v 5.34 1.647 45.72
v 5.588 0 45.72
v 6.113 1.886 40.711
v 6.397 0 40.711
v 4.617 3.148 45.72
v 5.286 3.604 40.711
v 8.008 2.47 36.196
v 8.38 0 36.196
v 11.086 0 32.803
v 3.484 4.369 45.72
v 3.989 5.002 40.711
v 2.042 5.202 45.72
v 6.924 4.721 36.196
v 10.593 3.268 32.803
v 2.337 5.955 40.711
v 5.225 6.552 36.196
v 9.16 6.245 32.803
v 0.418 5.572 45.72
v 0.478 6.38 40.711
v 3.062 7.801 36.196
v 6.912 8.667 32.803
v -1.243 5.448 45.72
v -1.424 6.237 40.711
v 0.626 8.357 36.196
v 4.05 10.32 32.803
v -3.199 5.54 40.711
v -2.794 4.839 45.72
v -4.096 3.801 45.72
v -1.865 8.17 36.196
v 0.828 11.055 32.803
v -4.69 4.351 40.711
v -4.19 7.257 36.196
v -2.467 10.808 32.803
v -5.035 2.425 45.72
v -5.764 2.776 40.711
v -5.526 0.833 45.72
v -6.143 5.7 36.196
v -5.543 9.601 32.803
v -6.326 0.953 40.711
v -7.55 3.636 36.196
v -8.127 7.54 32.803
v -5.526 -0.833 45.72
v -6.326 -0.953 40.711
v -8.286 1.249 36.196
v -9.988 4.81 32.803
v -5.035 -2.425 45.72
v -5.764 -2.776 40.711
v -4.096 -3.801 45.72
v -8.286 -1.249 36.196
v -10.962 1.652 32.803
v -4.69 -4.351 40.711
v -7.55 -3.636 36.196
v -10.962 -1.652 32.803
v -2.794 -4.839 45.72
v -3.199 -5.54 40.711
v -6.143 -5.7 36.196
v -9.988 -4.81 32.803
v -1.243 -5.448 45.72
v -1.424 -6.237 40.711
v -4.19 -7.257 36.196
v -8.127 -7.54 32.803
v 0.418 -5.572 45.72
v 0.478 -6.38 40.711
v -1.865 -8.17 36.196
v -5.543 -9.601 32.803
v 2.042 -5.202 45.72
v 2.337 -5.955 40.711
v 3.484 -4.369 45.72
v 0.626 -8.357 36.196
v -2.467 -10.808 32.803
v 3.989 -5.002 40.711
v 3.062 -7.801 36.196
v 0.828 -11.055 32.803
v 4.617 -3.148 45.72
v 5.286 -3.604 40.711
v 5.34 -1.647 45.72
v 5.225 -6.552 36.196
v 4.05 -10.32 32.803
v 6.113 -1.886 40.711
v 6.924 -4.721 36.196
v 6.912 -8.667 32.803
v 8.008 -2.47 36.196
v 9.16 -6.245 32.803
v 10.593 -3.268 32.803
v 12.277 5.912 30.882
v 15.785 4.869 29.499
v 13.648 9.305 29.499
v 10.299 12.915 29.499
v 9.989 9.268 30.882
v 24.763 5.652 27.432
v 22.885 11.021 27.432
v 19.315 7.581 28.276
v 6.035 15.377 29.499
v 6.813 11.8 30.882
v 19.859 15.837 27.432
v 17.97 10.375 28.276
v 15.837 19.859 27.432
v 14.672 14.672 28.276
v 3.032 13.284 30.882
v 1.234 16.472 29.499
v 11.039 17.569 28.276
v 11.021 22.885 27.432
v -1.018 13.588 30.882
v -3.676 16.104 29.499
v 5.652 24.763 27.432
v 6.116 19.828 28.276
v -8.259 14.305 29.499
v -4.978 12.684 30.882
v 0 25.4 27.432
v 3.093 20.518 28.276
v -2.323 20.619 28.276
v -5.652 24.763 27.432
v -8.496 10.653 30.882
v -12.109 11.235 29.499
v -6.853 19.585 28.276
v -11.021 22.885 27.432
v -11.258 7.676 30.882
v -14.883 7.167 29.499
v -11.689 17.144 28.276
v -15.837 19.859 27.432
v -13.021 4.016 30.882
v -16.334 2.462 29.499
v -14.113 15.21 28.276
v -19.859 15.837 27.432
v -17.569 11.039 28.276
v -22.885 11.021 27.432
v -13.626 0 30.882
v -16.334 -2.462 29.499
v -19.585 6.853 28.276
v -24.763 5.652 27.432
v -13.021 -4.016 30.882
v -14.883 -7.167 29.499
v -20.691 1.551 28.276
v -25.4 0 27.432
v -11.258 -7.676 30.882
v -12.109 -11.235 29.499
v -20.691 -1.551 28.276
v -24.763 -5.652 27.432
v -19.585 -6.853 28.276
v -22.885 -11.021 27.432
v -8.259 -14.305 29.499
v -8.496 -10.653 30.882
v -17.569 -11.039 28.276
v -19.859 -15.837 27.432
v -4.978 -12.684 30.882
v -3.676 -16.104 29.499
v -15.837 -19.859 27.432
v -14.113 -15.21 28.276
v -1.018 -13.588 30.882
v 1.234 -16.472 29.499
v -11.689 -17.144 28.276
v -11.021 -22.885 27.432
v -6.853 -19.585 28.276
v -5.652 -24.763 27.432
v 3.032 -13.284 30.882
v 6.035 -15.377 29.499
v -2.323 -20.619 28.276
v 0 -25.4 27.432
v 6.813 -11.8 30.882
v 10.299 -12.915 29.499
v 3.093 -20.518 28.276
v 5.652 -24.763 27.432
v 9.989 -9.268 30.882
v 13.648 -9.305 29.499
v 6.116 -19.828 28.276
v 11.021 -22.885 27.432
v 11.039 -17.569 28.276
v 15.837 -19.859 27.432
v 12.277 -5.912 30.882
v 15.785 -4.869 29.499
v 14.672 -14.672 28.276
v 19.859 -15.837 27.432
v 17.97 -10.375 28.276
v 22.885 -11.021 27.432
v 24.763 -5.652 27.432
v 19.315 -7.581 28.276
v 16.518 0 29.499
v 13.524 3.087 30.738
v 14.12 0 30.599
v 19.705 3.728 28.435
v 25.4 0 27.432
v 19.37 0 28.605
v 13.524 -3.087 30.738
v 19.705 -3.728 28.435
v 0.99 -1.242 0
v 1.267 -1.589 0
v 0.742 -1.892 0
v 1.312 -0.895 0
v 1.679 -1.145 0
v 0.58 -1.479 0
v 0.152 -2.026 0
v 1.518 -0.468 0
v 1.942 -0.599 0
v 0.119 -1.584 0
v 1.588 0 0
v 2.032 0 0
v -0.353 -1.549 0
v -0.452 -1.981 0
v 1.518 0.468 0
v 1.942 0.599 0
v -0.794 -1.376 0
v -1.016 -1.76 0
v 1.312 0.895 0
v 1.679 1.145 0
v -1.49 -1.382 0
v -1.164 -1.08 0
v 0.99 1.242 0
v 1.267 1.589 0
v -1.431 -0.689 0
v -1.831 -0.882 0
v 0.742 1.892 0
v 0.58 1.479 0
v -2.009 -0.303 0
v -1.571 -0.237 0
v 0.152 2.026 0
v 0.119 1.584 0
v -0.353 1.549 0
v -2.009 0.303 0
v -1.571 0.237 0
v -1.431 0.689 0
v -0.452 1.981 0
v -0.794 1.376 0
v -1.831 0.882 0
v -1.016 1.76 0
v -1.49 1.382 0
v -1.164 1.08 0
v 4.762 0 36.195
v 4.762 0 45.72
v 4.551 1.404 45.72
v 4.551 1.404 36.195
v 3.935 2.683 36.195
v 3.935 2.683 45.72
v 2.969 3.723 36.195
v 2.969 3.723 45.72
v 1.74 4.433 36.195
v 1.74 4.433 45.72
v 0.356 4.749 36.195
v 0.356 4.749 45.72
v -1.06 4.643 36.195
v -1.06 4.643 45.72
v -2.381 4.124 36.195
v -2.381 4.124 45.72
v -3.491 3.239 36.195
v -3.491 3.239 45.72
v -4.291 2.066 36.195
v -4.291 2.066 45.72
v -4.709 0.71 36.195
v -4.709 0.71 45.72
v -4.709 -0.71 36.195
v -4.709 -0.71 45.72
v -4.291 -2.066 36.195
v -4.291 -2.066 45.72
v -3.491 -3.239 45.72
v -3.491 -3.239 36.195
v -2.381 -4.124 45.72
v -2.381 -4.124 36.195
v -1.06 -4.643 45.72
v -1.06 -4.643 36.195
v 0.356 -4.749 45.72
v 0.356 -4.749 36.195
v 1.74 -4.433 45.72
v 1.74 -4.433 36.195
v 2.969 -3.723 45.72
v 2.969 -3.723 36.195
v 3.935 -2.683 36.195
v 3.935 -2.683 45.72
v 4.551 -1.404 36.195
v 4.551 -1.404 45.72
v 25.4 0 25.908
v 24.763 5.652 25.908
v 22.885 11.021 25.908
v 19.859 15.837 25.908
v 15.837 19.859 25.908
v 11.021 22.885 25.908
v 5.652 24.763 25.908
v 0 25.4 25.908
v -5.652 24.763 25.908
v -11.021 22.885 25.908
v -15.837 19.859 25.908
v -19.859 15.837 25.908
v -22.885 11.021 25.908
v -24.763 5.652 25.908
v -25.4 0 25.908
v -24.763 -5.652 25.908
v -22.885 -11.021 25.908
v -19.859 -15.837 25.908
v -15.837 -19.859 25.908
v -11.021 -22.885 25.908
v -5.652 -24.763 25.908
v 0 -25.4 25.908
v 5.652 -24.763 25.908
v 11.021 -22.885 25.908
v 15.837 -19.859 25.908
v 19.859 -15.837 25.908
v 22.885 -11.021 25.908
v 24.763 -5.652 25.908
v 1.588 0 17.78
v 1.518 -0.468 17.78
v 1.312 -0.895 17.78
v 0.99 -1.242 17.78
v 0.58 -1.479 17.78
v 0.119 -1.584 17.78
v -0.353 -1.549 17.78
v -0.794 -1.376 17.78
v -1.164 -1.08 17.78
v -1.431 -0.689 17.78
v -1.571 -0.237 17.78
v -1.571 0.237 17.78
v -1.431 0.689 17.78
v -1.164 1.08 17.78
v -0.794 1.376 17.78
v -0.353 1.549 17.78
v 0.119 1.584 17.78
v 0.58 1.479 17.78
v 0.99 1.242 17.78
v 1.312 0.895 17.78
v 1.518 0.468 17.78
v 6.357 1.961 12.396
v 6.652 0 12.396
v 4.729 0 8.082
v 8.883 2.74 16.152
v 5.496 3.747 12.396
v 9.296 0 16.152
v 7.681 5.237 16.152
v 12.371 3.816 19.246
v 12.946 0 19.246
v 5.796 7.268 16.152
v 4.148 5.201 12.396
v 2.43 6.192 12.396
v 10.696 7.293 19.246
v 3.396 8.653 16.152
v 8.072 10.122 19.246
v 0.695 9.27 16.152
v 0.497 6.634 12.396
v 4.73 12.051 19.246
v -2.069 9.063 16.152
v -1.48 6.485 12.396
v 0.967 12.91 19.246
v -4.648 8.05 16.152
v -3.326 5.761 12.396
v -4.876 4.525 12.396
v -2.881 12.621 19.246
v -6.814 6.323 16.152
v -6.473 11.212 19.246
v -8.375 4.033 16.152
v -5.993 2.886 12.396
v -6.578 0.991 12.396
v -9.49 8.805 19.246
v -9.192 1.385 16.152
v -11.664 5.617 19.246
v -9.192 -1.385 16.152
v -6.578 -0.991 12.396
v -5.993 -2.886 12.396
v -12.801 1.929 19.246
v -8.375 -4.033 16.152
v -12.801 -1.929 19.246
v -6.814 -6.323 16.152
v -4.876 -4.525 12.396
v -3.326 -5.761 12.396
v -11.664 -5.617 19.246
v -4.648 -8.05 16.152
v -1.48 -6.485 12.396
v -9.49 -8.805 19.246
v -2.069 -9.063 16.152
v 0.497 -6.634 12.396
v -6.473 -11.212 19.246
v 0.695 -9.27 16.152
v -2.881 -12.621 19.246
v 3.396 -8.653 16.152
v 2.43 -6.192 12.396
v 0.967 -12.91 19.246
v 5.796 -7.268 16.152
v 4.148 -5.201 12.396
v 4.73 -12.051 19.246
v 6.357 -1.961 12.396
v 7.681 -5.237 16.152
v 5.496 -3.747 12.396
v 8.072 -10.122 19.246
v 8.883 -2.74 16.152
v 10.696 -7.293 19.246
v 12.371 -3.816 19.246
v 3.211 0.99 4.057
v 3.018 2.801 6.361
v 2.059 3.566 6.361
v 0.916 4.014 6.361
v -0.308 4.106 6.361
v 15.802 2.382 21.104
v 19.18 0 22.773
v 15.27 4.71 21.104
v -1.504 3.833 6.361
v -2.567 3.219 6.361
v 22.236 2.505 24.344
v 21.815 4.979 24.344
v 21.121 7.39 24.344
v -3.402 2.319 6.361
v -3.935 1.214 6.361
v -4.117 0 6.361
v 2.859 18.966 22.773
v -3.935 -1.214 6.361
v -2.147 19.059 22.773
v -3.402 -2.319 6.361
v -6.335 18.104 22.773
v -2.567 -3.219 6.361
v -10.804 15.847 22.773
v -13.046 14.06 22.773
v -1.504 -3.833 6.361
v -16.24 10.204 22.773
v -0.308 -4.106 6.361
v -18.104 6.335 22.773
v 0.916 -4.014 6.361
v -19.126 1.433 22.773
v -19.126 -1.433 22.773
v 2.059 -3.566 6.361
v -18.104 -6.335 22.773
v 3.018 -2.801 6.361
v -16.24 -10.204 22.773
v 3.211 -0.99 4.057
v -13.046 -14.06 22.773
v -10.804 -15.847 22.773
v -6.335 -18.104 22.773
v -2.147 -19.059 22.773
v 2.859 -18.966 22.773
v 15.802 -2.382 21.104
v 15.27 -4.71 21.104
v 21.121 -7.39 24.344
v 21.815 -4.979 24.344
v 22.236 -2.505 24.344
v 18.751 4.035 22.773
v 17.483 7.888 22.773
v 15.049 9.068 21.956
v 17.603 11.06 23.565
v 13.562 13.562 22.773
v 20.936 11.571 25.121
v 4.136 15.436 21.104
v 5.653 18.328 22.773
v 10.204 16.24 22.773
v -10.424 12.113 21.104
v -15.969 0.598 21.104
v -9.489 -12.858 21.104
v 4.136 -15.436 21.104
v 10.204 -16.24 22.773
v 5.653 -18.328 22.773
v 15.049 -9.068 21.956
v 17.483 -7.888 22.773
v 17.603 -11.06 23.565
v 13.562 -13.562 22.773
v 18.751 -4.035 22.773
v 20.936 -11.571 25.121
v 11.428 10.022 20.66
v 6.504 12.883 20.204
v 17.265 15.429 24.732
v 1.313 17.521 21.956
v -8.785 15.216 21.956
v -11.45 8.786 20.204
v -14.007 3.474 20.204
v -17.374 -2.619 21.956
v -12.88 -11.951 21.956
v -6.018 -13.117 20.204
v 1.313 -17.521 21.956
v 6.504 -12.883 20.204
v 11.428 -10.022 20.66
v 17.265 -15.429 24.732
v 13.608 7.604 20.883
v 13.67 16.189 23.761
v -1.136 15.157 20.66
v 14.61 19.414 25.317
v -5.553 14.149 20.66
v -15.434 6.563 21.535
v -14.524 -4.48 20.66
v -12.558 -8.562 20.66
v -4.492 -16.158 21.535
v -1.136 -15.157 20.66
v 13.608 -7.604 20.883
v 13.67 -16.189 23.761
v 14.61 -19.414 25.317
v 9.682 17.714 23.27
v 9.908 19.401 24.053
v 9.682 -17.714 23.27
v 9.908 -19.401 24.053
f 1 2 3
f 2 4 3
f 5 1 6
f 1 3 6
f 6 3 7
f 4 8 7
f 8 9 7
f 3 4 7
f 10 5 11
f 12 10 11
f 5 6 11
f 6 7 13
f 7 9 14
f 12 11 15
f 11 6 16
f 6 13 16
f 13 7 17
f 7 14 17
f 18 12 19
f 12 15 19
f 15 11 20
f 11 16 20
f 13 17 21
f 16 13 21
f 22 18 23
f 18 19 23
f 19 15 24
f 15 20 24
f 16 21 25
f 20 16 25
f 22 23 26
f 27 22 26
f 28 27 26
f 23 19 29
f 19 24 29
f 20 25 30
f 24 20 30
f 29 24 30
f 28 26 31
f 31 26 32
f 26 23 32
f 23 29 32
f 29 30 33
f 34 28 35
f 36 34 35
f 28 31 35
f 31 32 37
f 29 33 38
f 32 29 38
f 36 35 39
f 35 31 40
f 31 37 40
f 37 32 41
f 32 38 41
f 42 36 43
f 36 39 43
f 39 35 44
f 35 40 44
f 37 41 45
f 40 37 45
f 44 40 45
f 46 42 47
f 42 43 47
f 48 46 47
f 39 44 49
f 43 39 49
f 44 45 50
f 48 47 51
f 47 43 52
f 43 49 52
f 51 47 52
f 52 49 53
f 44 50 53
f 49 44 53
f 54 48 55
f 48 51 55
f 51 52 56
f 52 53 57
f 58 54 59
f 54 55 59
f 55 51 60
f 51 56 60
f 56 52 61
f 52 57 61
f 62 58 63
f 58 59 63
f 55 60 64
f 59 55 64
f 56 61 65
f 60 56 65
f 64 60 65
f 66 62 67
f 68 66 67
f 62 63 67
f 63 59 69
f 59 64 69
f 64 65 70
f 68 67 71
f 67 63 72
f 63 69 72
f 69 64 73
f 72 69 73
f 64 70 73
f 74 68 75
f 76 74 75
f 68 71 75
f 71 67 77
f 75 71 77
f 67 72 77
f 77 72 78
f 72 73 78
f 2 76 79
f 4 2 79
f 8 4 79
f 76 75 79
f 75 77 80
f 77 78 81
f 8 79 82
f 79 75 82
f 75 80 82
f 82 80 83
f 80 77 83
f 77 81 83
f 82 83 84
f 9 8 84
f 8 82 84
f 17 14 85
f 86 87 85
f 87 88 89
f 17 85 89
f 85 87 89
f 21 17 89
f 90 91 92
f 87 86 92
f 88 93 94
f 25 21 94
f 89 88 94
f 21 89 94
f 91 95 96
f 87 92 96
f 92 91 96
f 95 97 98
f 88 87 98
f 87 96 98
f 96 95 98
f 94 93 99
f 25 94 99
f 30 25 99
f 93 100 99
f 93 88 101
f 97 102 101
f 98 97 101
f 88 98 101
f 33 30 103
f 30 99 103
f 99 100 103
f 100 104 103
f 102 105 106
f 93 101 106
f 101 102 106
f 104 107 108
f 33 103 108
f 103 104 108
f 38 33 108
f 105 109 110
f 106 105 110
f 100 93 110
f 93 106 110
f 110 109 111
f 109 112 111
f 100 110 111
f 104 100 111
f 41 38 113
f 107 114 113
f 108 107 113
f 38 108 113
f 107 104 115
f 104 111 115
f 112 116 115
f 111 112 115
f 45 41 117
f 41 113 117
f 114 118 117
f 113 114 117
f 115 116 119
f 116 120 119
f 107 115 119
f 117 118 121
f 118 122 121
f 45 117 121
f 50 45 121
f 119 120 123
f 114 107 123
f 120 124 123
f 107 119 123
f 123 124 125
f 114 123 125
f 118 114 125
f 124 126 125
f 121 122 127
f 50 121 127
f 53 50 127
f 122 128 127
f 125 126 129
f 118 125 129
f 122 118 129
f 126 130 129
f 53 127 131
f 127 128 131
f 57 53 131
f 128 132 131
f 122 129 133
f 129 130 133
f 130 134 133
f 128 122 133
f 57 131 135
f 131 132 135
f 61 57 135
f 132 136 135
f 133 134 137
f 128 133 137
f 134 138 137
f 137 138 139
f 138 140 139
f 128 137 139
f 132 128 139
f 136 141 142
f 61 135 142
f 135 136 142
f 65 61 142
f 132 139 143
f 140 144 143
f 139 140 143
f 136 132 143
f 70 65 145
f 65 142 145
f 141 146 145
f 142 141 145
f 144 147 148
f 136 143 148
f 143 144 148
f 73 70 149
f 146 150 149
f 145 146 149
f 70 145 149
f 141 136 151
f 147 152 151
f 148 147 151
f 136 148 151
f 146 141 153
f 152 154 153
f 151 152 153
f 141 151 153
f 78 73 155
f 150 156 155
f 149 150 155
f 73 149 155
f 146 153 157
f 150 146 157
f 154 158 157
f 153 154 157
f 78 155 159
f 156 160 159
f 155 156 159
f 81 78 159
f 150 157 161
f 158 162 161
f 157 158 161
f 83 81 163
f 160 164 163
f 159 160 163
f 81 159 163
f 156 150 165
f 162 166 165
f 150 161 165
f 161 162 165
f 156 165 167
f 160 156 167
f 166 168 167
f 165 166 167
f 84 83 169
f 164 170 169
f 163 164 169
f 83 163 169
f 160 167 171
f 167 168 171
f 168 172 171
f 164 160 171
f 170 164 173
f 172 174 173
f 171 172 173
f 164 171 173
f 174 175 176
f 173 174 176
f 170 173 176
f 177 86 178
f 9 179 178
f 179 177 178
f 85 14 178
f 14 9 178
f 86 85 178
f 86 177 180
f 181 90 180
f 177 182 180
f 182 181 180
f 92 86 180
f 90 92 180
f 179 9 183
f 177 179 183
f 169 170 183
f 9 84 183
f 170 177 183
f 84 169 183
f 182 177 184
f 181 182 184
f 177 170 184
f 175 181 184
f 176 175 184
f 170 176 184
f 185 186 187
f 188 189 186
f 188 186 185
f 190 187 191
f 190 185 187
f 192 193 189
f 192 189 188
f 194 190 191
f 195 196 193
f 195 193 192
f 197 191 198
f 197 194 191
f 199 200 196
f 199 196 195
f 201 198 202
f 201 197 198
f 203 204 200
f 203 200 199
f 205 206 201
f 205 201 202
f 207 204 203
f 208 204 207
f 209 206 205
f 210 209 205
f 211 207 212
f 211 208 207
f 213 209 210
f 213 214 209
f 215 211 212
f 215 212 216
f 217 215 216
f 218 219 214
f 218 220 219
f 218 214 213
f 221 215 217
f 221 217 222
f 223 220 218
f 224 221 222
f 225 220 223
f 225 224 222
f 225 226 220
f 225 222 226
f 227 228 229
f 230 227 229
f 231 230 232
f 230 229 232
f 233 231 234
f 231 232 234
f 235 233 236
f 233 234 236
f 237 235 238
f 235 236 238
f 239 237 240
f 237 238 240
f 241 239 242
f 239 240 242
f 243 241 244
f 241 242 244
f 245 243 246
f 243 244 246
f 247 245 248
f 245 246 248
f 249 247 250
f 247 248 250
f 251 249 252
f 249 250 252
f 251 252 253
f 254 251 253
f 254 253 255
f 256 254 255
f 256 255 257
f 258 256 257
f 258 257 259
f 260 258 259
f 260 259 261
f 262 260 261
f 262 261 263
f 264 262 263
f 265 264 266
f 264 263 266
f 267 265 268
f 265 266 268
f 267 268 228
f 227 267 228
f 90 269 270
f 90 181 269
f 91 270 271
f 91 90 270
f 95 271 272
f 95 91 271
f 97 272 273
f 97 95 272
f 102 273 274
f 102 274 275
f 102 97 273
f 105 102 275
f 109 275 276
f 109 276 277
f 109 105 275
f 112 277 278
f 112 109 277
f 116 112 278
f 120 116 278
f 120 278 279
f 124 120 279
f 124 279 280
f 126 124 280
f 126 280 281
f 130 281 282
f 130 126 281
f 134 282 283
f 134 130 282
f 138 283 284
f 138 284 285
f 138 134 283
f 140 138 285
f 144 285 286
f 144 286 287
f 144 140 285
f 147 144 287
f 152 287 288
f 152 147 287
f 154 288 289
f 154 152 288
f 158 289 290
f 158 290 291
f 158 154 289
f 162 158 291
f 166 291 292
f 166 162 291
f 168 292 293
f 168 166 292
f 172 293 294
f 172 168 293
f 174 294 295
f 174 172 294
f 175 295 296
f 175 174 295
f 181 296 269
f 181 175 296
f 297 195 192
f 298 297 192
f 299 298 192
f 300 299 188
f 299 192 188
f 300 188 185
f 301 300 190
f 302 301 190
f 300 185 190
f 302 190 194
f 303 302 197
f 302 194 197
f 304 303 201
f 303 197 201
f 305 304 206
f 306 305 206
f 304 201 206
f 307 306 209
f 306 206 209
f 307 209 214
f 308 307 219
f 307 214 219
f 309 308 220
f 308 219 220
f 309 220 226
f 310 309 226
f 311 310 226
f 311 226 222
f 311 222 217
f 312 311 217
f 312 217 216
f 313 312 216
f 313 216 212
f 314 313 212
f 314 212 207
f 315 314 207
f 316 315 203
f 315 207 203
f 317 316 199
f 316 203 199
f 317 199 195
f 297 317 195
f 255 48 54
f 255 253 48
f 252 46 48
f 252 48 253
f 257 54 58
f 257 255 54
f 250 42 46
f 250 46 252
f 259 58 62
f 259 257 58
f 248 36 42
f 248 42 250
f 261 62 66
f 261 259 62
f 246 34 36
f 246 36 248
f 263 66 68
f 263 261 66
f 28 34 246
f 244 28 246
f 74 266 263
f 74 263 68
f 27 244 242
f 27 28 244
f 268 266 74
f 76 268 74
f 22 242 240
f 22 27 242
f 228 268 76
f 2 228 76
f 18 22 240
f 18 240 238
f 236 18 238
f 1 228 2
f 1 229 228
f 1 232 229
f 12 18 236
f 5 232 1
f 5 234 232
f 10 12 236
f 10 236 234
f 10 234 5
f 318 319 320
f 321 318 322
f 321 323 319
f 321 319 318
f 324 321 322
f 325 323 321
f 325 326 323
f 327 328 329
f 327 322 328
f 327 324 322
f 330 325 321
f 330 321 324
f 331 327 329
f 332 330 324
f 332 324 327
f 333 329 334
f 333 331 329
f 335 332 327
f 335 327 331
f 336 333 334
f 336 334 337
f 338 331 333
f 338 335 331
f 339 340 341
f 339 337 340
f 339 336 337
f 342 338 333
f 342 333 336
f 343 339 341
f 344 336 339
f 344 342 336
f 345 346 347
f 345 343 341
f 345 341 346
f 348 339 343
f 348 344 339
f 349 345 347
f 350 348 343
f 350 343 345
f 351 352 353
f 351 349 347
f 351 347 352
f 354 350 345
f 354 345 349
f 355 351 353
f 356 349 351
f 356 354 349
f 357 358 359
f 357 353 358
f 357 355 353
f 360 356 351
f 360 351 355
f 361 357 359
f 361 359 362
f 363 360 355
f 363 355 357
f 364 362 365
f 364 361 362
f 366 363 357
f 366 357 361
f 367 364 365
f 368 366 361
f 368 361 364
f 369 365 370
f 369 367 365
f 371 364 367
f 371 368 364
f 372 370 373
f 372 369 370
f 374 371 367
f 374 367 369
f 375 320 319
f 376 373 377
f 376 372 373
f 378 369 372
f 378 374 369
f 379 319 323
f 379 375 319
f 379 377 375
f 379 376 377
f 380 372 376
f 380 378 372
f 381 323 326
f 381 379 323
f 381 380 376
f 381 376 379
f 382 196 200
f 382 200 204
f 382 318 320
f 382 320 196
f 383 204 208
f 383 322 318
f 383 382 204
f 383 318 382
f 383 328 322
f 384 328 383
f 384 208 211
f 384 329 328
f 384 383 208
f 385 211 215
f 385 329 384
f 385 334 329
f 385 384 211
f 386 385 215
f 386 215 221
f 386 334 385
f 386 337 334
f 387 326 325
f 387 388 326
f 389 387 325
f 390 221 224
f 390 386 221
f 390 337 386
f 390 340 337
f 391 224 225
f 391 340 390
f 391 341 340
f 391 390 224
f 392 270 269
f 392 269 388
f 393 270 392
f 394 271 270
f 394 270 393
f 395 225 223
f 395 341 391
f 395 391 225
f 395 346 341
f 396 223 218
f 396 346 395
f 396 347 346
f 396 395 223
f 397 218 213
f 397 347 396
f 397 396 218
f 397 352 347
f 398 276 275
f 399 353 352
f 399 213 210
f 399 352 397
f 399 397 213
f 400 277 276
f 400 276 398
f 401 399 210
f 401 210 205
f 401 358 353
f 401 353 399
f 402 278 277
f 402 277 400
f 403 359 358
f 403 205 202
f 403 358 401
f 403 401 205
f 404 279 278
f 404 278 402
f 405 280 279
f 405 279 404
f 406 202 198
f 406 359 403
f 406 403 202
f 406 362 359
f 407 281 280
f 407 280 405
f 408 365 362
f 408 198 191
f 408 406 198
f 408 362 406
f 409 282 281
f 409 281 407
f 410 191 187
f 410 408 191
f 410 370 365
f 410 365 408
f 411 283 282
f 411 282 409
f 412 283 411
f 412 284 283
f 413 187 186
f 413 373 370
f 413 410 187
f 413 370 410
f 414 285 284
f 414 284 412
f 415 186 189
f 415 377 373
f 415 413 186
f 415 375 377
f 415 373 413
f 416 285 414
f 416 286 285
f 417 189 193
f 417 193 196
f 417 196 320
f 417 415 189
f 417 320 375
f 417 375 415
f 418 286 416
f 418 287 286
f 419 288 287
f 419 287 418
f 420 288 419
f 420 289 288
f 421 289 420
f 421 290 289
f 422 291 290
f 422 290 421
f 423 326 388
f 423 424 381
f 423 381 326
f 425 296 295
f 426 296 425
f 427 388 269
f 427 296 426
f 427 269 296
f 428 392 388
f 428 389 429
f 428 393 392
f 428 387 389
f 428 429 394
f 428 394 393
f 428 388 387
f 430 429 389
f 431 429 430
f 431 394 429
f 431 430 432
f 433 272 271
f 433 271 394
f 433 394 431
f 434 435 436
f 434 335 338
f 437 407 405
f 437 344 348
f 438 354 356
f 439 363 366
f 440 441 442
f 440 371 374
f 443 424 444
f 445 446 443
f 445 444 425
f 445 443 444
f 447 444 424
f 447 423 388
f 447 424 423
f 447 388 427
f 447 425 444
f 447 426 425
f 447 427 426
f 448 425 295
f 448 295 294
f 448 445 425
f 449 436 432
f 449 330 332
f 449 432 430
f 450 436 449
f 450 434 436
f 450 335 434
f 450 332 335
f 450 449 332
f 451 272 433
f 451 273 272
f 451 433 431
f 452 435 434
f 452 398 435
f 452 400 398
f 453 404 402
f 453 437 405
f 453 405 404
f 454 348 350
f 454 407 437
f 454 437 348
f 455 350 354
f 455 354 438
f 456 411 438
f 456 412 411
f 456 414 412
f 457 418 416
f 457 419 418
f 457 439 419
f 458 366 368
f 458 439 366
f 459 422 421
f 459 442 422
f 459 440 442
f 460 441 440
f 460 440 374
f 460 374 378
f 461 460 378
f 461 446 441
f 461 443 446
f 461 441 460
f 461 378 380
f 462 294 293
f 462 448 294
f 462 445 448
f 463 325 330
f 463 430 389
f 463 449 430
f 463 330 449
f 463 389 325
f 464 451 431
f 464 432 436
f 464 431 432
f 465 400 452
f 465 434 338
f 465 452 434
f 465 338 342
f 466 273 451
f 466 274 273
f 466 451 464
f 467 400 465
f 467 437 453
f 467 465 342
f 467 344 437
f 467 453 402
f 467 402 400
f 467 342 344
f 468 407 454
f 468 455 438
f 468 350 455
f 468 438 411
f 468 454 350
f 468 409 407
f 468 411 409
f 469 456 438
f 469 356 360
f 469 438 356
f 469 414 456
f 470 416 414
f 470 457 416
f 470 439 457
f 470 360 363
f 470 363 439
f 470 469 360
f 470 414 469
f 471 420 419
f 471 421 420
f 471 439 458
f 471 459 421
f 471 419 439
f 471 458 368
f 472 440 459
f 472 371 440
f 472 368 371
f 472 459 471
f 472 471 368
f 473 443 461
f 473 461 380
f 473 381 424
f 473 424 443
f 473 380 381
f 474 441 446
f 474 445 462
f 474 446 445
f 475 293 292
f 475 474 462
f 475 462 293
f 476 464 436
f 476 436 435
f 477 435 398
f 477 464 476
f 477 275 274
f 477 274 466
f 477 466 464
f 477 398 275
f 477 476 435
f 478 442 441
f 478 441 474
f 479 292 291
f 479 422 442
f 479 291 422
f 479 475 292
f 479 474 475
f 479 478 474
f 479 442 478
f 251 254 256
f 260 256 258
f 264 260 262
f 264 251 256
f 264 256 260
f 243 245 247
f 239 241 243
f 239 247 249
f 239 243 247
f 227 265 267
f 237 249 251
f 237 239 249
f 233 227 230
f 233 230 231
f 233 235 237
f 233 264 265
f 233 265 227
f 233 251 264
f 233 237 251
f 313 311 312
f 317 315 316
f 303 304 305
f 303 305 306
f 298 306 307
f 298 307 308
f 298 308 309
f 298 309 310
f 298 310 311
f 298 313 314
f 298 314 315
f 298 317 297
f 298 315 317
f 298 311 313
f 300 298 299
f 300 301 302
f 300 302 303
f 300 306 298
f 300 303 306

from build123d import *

# Parameters (mm, degrees)
F2_R     = 4.7625
F3_DEPTH = 9.525
F4_R     = 1.5884269423
F5_DEPTH = 17.78


with BuildPart() as f1:
    # F0 (on Front) → F1 (revolve)
    with BuildSketch(Plane.XZ):
        with BuildLine():
            Line((0, 45.72), (0, 0))
            Line((0, 0), (2.032, 0))
            add(Edge.make_bspline(
                [(2.032, 0), (4.0125234635, 5.712802884), (6.7370530543, 18.2060480538), (20.2172267396, 23.0468985691), (25.4, 25.908)],
                knots=[0, 0, 0, 0, 0.4925394747, 1, 1, 1, 1], degree=3))
            Line((25.4, 25.908), (25.4, 27.432))
            add(Edge.make_bspline(
                [(5.588, 45.72), (5.75367604, 40.4324909312), (10.4063519162, 30.2436000775), (20.018908953, 28.275345569), (25.4, 27.432)],
                knots=[0, 0, 0, 0, 0.5016412558, 1, 1, 1, 1], degree=3))
            Line((5.588, 45.72), (0, 45.72))
        make_face()
    revolve(axis=Axis((0, 0, 22.86), (0, 0, 1)))

    # F2 (on face) → F3 (cut)
    with BuildSketch(Plane.XY.offset(45.72)):
        Circle(F2_R)
    extrude(amount=-F3_DEPTH, mode=Mode.SUBTRACT)

    # F4 (on face) → F5 (cut)
    with BuildSketch(Plane(origin=(0, 0, 0), x_dir=(1, 0, 0), z_dir=(0, 0, -1))):
        Circle(F4_R)
    extrude(amount=-F5_DEPTH, mode=Mode.SUBTRACT)


solid = f1.part
